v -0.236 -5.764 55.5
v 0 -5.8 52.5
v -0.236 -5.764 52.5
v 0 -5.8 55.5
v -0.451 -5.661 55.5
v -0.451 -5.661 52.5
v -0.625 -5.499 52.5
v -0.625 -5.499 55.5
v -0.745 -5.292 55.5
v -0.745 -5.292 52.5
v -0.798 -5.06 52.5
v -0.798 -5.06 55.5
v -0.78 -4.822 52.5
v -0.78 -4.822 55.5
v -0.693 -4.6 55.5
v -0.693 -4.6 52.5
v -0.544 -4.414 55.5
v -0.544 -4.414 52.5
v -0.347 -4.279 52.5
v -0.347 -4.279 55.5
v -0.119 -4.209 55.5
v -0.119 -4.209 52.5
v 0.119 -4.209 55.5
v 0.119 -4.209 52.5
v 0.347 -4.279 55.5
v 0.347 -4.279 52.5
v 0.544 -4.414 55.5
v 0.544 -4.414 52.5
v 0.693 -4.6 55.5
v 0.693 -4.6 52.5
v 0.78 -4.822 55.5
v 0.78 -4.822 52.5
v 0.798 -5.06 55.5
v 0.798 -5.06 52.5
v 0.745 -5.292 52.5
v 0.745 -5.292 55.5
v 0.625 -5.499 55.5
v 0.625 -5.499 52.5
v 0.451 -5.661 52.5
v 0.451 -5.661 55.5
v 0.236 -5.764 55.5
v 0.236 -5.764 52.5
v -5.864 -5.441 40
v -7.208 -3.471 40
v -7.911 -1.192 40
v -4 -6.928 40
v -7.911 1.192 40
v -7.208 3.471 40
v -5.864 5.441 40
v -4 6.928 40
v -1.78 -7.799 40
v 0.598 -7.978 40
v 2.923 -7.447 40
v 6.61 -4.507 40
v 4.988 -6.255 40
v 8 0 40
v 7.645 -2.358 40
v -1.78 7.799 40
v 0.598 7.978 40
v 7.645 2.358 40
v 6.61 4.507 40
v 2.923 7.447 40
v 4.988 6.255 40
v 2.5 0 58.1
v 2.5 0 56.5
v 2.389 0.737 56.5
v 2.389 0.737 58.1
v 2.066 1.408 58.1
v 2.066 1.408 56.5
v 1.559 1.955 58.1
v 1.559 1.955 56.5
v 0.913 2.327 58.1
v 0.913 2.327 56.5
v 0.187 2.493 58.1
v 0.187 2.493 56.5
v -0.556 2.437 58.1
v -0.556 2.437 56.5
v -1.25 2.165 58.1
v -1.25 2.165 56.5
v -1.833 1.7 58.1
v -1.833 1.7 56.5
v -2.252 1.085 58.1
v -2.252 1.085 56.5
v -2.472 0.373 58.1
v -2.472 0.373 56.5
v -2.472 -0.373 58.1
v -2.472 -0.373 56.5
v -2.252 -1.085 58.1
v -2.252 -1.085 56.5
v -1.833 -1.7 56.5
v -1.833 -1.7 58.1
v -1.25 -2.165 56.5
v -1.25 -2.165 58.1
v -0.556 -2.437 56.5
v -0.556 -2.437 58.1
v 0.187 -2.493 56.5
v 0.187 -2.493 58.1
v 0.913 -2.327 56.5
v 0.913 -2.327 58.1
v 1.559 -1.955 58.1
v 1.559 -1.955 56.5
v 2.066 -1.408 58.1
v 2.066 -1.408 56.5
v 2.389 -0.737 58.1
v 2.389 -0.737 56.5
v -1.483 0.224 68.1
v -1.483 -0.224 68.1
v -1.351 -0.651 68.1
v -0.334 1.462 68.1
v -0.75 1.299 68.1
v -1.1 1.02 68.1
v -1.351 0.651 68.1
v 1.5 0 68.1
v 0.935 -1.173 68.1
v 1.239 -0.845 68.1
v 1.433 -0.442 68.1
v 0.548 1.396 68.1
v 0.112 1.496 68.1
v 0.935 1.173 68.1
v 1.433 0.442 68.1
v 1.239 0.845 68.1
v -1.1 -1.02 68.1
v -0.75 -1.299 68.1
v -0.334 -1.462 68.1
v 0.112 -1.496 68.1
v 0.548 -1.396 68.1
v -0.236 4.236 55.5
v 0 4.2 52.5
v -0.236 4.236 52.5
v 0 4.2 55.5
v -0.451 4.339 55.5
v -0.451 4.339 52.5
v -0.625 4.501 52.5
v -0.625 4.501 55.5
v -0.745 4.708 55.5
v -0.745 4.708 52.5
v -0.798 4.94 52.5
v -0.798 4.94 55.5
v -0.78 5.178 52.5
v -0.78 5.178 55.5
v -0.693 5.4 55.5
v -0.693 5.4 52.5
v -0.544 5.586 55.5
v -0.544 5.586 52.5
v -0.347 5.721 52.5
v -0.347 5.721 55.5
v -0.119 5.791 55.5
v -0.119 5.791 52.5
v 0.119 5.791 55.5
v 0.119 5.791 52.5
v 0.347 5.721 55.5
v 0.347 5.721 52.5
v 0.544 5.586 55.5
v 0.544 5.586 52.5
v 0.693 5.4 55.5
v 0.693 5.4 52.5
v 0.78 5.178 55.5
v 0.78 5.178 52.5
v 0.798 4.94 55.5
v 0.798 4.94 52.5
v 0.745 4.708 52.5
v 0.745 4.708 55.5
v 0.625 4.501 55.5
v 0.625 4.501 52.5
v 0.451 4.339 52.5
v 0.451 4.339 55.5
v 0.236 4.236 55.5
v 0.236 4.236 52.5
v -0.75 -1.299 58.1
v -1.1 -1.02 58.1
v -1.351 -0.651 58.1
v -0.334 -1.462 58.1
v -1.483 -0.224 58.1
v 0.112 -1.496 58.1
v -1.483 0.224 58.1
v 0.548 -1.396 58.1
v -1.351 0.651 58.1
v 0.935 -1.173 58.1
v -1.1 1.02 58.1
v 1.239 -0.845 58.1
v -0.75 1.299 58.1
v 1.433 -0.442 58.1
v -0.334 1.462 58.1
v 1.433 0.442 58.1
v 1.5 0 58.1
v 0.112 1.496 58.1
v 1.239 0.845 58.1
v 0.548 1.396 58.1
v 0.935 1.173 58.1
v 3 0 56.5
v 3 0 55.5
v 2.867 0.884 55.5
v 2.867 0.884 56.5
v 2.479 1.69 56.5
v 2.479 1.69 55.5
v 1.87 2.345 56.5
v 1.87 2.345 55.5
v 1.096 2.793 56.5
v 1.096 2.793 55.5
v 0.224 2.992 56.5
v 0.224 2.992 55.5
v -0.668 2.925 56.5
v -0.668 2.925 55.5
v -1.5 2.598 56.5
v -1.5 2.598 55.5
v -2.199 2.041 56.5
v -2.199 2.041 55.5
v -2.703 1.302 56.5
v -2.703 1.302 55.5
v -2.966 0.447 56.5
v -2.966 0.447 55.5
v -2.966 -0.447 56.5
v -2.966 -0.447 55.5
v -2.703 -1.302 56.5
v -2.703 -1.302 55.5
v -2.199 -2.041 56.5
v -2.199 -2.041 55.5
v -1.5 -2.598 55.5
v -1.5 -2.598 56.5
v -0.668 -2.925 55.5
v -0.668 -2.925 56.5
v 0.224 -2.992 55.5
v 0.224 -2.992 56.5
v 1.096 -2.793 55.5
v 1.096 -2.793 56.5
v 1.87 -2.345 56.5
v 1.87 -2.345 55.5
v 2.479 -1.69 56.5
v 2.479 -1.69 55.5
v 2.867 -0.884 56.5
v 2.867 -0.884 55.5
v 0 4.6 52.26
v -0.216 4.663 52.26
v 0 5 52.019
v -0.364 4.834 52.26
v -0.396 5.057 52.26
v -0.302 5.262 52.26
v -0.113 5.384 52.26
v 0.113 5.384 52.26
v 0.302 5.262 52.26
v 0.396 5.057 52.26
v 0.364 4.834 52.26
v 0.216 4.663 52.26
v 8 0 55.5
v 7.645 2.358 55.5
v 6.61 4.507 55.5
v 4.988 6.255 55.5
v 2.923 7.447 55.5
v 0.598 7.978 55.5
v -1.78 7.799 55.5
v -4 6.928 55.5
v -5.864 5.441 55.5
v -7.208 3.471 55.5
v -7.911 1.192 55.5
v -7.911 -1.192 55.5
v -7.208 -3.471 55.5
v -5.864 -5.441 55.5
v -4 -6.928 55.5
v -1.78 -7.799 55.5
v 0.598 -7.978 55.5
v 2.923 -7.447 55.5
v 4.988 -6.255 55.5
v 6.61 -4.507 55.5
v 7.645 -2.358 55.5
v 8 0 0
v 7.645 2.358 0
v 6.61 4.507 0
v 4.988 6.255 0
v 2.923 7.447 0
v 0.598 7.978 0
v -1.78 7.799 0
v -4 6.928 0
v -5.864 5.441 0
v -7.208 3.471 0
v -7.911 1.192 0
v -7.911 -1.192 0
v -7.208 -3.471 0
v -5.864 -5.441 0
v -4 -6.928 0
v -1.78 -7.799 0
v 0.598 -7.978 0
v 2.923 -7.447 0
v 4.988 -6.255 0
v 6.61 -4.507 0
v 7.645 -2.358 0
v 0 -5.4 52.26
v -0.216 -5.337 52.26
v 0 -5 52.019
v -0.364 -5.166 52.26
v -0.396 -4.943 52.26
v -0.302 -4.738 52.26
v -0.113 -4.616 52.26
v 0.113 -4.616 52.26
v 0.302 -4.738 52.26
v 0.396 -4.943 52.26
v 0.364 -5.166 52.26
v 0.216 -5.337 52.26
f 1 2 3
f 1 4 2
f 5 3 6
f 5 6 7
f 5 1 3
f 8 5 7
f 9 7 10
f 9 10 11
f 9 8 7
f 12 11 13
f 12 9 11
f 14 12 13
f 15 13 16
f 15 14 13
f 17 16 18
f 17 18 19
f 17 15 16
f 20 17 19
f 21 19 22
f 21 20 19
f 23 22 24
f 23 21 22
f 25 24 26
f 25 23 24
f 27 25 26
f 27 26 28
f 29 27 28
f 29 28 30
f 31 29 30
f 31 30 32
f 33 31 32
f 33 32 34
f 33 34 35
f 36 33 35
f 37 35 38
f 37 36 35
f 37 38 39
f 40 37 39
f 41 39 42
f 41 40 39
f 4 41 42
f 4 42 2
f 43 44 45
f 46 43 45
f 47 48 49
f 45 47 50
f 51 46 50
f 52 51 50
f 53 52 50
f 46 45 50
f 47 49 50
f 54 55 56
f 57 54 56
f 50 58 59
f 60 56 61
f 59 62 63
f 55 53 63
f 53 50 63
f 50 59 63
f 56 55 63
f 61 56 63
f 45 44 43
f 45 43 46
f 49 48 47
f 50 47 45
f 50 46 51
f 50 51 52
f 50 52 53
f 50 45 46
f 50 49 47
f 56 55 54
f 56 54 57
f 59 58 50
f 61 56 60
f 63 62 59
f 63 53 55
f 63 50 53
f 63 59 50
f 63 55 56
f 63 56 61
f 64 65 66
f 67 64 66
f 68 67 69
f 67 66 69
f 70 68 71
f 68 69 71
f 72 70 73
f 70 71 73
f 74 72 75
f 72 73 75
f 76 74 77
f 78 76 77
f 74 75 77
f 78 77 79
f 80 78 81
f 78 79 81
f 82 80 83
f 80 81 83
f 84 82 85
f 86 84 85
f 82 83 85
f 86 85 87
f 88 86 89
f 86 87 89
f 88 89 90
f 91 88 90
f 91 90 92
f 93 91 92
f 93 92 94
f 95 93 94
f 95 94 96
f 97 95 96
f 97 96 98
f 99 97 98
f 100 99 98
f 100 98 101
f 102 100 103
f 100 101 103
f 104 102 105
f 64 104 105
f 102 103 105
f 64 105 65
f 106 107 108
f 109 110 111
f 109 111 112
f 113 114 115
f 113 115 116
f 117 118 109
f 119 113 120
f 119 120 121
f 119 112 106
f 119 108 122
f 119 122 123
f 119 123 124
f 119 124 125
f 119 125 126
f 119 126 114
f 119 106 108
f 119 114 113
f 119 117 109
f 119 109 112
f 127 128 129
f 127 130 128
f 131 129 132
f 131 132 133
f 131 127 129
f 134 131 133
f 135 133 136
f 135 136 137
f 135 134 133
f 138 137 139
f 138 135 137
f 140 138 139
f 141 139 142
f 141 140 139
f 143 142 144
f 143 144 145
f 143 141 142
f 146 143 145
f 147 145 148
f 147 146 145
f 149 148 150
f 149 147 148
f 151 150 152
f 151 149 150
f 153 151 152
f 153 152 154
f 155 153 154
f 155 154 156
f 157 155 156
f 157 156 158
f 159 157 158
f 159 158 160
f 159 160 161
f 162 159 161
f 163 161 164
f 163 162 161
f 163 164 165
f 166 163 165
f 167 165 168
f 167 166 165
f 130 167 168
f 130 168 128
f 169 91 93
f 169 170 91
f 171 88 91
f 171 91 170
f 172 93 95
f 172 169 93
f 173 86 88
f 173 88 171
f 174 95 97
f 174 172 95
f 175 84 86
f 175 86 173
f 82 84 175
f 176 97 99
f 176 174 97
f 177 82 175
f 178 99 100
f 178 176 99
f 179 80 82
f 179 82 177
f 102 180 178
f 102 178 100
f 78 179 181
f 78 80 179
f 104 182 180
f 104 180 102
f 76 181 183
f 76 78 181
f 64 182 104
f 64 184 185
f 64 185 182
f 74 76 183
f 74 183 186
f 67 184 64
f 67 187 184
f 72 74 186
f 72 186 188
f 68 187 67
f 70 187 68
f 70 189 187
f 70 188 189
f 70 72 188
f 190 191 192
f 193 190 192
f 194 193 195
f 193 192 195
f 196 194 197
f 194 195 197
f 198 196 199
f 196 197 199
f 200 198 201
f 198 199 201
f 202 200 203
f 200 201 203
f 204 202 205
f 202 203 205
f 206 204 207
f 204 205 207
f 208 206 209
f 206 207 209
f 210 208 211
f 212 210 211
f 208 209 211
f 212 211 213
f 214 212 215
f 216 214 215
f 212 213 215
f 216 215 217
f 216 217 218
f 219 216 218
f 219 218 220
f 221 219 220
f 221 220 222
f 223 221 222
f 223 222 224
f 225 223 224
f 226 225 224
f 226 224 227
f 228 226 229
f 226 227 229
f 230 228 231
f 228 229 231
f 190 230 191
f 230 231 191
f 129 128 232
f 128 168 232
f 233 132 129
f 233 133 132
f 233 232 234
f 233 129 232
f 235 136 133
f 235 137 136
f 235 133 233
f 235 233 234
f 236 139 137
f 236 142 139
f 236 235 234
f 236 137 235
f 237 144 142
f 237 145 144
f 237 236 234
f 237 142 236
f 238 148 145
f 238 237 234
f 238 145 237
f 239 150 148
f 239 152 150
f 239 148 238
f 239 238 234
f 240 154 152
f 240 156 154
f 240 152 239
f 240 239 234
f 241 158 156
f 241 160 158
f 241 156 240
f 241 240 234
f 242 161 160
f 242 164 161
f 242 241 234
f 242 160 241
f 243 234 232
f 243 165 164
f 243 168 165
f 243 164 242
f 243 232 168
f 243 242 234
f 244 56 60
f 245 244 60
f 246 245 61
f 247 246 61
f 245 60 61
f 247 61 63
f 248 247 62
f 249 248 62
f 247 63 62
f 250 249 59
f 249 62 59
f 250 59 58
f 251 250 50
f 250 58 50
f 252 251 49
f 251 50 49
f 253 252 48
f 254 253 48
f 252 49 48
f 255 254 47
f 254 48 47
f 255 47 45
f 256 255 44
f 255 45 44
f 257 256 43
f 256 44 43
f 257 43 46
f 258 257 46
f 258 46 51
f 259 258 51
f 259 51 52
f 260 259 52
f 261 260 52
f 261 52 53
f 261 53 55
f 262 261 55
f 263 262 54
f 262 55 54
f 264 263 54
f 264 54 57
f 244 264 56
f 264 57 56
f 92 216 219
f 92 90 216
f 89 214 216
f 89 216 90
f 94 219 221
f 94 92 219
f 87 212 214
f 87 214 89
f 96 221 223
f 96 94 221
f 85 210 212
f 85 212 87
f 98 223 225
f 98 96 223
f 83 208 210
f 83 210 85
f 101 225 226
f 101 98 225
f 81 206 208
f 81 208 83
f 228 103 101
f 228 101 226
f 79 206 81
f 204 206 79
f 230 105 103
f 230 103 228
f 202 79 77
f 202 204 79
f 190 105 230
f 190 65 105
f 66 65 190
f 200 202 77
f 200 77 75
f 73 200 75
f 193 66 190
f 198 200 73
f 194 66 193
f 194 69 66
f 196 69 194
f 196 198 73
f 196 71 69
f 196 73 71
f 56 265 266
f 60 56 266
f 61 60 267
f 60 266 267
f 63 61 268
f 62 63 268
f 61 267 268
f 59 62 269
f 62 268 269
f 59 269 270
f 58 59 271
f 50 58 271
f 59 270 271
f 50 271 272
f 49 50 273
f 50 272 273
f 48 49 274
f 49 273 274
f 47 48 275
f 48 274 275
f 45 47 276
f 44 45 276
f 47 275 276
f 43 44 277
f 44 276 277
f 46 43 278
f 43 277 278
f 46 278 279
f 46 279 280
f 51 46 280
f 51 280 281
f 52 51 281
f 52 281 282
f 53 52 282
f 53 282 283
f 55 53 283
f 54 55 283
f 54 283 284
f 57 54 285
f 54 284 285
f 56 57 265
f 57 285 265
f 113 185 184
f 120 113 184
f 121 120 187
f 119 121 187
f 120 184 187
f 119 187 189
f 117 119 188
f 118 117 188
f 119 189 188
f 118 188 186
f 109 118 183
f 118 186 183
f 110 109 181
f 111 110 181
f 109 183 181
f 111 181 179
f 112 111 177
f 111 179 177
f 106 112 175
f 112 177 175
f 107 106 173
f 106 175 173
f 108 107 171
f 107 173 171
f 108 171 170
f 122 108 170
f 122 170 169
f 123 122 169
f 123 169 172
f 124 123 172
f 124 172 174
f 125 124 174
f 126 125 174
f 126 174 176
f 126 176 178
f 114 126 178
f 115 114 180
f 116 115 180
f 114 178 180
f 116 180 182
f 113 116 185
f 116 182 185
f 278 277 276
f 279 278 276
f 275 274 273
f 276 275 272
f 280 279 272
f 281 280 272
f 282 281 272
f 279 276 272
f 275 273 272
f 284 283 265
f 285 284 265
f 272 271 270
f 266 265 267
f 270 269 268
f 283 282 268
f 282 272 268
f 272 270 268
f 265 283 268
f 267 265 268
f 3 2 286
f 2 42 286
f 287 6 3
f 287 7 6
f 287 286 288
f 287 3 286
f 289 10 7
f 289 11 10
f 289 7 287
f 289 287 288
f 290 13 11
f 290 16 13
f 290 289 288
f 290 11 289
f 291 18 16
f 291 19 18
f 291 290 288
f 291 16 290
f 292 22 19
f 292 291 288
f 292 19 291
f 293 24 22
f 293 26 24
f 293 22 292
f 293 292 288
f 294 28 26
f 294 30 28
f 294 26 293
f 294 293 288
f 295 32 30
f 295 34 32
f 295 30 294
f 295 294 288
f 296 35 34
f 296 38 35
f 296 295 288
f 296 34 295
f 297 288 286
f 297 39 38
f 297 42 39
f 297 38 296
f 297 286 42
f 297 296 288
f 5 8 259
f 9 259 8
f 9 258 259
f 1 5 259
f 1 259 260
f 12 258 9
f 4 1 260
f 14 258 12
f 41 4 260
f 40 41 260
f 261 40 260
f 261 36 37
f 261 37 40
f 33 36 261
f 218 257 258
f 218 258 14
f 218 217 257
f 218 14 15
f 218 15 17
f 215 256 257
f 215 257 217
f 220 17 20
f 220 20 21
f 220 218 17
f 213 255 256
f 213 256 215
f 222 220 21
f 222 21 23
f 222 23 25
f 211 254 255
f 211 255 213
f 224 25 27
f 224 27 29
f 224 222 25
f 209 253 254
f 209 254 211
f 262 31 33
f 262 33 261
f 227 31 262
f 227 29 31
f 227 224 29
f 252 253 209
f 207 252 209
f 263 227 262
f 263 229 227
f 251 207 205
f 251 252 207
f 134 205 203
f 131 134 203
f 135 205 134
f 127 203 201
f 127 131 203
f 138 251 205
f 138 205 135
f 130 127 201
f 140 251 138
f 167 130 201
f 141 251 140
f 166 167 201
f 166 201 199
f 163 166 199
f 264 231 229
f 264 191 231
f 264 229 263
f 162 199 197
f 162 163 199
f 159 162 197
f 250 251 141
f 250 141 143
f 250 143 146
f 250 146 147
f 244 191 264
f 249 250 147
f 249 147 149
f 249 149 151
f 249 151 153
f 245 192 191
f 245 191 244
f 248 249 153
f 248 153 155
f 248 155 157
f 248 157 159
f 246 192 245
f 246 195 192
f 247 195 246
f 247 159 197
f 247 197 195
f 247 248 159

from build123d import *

# Parameters (mm, degrees)
SKETCH1_R                  = 8
EXTRUDE1_DEPTH             = 40
SKETCH2_R                  = 8
EXTRUDE2_DEPTH             = 15.5
SKETCH3_R                  = 3
EXTRUDE3_DEPTH             = 1
SKETCH4_R                  = 2.5
EXTRUDE4_DEPTH             = 1.6
SKETCH5_R                  = 1.5
EXTRUDE5_DEPTH             = 10
SKETCH6_R                  = 0.75
EXTRUDE6_DEPTH             = 3
M2_TAPPED_HOLE1_AT_2_COUNT = 2
M2_TAPPED_HOLE1_AT_2_PITCH = 10


with BuildPart() as part:
    # Sketch1 → Extrude1 (new body)
    with BuildSketch(Plane.XY):
        Circle(SKETCH1_R)
    extrude(amount=EXTRUDE1_DEPTH)


with BuildPart() as body_2:
    # Sketch2 → Extrude2 (new body)
    with BuildSketch(Plane.XY.offset(40)):
        Circle(SKETCH2_R)
    extrude(amount=EXTRUDE2_DEPTH)

    # Sketch3 → Extrude3 (add)
    with BuildSketch(Plane.XY.offset(55.5)):
        Circle(SKETCH3_R)
    extrude(amount=EXTRUDE3_DEPTH)

    # Sketch4 → Extrude4 (add)
    with BuildSketch(Plane.XY.offset(56.5)):
        Circle(SKETCH4_R)
    extrude(amount=EXTRUDE4_DEPTH)

    # Sketch5 → Extrude5 (add)
    with BuildSketch(Plane.XY.offset(58.1)):
        Circle(SKETCH5_R)
    extrude(amount=EXTRUDE5_DEPTH)

    # Sketch6 → Extrude6 (cut)
    with BuildSketch(Plane.XY.offset(55.5)):
        with Locations((0, 5)):
            Circle(SKETCH6_R)
        with Locations((0, -5)):
            Circle(SKETCH6_R)
    extrude(amount=-EXTRUDE6_DEPTH, mode=Mode.SUBTRACT)

    # Sketch7 → M2 Tapped Hole1 (revolve, cut)
    with BuildSketch(Plane(origin=(0, 5, 55.5), x_dir=(0, -1, 0), z_dir=(1, 0, 0))):
        Polygon((0, 0), (0, 3.480688495), (0.8, 3), (0.8, 0), align=None)
    m2_tapped_hole1 = revolve(axis=Axis((0, 5, 61.85), (0, 0, -1)), mode=Mode.SUBTRACT)

    # M2 Tapped Hole1 at 2: M2 Tapped Hole1 ×2
    with Locations(*[(0, -i * M2_TAPPED_HOLE1_AT_2_PITCH, 0) for i in range(1, M2_TAPPED_HOLE1_AT_2_COUNT)]):
        add(m2_tapped_hole1, mode=Mode.SUBTRACT)


solid = Compound([part.part, body_2.part])
